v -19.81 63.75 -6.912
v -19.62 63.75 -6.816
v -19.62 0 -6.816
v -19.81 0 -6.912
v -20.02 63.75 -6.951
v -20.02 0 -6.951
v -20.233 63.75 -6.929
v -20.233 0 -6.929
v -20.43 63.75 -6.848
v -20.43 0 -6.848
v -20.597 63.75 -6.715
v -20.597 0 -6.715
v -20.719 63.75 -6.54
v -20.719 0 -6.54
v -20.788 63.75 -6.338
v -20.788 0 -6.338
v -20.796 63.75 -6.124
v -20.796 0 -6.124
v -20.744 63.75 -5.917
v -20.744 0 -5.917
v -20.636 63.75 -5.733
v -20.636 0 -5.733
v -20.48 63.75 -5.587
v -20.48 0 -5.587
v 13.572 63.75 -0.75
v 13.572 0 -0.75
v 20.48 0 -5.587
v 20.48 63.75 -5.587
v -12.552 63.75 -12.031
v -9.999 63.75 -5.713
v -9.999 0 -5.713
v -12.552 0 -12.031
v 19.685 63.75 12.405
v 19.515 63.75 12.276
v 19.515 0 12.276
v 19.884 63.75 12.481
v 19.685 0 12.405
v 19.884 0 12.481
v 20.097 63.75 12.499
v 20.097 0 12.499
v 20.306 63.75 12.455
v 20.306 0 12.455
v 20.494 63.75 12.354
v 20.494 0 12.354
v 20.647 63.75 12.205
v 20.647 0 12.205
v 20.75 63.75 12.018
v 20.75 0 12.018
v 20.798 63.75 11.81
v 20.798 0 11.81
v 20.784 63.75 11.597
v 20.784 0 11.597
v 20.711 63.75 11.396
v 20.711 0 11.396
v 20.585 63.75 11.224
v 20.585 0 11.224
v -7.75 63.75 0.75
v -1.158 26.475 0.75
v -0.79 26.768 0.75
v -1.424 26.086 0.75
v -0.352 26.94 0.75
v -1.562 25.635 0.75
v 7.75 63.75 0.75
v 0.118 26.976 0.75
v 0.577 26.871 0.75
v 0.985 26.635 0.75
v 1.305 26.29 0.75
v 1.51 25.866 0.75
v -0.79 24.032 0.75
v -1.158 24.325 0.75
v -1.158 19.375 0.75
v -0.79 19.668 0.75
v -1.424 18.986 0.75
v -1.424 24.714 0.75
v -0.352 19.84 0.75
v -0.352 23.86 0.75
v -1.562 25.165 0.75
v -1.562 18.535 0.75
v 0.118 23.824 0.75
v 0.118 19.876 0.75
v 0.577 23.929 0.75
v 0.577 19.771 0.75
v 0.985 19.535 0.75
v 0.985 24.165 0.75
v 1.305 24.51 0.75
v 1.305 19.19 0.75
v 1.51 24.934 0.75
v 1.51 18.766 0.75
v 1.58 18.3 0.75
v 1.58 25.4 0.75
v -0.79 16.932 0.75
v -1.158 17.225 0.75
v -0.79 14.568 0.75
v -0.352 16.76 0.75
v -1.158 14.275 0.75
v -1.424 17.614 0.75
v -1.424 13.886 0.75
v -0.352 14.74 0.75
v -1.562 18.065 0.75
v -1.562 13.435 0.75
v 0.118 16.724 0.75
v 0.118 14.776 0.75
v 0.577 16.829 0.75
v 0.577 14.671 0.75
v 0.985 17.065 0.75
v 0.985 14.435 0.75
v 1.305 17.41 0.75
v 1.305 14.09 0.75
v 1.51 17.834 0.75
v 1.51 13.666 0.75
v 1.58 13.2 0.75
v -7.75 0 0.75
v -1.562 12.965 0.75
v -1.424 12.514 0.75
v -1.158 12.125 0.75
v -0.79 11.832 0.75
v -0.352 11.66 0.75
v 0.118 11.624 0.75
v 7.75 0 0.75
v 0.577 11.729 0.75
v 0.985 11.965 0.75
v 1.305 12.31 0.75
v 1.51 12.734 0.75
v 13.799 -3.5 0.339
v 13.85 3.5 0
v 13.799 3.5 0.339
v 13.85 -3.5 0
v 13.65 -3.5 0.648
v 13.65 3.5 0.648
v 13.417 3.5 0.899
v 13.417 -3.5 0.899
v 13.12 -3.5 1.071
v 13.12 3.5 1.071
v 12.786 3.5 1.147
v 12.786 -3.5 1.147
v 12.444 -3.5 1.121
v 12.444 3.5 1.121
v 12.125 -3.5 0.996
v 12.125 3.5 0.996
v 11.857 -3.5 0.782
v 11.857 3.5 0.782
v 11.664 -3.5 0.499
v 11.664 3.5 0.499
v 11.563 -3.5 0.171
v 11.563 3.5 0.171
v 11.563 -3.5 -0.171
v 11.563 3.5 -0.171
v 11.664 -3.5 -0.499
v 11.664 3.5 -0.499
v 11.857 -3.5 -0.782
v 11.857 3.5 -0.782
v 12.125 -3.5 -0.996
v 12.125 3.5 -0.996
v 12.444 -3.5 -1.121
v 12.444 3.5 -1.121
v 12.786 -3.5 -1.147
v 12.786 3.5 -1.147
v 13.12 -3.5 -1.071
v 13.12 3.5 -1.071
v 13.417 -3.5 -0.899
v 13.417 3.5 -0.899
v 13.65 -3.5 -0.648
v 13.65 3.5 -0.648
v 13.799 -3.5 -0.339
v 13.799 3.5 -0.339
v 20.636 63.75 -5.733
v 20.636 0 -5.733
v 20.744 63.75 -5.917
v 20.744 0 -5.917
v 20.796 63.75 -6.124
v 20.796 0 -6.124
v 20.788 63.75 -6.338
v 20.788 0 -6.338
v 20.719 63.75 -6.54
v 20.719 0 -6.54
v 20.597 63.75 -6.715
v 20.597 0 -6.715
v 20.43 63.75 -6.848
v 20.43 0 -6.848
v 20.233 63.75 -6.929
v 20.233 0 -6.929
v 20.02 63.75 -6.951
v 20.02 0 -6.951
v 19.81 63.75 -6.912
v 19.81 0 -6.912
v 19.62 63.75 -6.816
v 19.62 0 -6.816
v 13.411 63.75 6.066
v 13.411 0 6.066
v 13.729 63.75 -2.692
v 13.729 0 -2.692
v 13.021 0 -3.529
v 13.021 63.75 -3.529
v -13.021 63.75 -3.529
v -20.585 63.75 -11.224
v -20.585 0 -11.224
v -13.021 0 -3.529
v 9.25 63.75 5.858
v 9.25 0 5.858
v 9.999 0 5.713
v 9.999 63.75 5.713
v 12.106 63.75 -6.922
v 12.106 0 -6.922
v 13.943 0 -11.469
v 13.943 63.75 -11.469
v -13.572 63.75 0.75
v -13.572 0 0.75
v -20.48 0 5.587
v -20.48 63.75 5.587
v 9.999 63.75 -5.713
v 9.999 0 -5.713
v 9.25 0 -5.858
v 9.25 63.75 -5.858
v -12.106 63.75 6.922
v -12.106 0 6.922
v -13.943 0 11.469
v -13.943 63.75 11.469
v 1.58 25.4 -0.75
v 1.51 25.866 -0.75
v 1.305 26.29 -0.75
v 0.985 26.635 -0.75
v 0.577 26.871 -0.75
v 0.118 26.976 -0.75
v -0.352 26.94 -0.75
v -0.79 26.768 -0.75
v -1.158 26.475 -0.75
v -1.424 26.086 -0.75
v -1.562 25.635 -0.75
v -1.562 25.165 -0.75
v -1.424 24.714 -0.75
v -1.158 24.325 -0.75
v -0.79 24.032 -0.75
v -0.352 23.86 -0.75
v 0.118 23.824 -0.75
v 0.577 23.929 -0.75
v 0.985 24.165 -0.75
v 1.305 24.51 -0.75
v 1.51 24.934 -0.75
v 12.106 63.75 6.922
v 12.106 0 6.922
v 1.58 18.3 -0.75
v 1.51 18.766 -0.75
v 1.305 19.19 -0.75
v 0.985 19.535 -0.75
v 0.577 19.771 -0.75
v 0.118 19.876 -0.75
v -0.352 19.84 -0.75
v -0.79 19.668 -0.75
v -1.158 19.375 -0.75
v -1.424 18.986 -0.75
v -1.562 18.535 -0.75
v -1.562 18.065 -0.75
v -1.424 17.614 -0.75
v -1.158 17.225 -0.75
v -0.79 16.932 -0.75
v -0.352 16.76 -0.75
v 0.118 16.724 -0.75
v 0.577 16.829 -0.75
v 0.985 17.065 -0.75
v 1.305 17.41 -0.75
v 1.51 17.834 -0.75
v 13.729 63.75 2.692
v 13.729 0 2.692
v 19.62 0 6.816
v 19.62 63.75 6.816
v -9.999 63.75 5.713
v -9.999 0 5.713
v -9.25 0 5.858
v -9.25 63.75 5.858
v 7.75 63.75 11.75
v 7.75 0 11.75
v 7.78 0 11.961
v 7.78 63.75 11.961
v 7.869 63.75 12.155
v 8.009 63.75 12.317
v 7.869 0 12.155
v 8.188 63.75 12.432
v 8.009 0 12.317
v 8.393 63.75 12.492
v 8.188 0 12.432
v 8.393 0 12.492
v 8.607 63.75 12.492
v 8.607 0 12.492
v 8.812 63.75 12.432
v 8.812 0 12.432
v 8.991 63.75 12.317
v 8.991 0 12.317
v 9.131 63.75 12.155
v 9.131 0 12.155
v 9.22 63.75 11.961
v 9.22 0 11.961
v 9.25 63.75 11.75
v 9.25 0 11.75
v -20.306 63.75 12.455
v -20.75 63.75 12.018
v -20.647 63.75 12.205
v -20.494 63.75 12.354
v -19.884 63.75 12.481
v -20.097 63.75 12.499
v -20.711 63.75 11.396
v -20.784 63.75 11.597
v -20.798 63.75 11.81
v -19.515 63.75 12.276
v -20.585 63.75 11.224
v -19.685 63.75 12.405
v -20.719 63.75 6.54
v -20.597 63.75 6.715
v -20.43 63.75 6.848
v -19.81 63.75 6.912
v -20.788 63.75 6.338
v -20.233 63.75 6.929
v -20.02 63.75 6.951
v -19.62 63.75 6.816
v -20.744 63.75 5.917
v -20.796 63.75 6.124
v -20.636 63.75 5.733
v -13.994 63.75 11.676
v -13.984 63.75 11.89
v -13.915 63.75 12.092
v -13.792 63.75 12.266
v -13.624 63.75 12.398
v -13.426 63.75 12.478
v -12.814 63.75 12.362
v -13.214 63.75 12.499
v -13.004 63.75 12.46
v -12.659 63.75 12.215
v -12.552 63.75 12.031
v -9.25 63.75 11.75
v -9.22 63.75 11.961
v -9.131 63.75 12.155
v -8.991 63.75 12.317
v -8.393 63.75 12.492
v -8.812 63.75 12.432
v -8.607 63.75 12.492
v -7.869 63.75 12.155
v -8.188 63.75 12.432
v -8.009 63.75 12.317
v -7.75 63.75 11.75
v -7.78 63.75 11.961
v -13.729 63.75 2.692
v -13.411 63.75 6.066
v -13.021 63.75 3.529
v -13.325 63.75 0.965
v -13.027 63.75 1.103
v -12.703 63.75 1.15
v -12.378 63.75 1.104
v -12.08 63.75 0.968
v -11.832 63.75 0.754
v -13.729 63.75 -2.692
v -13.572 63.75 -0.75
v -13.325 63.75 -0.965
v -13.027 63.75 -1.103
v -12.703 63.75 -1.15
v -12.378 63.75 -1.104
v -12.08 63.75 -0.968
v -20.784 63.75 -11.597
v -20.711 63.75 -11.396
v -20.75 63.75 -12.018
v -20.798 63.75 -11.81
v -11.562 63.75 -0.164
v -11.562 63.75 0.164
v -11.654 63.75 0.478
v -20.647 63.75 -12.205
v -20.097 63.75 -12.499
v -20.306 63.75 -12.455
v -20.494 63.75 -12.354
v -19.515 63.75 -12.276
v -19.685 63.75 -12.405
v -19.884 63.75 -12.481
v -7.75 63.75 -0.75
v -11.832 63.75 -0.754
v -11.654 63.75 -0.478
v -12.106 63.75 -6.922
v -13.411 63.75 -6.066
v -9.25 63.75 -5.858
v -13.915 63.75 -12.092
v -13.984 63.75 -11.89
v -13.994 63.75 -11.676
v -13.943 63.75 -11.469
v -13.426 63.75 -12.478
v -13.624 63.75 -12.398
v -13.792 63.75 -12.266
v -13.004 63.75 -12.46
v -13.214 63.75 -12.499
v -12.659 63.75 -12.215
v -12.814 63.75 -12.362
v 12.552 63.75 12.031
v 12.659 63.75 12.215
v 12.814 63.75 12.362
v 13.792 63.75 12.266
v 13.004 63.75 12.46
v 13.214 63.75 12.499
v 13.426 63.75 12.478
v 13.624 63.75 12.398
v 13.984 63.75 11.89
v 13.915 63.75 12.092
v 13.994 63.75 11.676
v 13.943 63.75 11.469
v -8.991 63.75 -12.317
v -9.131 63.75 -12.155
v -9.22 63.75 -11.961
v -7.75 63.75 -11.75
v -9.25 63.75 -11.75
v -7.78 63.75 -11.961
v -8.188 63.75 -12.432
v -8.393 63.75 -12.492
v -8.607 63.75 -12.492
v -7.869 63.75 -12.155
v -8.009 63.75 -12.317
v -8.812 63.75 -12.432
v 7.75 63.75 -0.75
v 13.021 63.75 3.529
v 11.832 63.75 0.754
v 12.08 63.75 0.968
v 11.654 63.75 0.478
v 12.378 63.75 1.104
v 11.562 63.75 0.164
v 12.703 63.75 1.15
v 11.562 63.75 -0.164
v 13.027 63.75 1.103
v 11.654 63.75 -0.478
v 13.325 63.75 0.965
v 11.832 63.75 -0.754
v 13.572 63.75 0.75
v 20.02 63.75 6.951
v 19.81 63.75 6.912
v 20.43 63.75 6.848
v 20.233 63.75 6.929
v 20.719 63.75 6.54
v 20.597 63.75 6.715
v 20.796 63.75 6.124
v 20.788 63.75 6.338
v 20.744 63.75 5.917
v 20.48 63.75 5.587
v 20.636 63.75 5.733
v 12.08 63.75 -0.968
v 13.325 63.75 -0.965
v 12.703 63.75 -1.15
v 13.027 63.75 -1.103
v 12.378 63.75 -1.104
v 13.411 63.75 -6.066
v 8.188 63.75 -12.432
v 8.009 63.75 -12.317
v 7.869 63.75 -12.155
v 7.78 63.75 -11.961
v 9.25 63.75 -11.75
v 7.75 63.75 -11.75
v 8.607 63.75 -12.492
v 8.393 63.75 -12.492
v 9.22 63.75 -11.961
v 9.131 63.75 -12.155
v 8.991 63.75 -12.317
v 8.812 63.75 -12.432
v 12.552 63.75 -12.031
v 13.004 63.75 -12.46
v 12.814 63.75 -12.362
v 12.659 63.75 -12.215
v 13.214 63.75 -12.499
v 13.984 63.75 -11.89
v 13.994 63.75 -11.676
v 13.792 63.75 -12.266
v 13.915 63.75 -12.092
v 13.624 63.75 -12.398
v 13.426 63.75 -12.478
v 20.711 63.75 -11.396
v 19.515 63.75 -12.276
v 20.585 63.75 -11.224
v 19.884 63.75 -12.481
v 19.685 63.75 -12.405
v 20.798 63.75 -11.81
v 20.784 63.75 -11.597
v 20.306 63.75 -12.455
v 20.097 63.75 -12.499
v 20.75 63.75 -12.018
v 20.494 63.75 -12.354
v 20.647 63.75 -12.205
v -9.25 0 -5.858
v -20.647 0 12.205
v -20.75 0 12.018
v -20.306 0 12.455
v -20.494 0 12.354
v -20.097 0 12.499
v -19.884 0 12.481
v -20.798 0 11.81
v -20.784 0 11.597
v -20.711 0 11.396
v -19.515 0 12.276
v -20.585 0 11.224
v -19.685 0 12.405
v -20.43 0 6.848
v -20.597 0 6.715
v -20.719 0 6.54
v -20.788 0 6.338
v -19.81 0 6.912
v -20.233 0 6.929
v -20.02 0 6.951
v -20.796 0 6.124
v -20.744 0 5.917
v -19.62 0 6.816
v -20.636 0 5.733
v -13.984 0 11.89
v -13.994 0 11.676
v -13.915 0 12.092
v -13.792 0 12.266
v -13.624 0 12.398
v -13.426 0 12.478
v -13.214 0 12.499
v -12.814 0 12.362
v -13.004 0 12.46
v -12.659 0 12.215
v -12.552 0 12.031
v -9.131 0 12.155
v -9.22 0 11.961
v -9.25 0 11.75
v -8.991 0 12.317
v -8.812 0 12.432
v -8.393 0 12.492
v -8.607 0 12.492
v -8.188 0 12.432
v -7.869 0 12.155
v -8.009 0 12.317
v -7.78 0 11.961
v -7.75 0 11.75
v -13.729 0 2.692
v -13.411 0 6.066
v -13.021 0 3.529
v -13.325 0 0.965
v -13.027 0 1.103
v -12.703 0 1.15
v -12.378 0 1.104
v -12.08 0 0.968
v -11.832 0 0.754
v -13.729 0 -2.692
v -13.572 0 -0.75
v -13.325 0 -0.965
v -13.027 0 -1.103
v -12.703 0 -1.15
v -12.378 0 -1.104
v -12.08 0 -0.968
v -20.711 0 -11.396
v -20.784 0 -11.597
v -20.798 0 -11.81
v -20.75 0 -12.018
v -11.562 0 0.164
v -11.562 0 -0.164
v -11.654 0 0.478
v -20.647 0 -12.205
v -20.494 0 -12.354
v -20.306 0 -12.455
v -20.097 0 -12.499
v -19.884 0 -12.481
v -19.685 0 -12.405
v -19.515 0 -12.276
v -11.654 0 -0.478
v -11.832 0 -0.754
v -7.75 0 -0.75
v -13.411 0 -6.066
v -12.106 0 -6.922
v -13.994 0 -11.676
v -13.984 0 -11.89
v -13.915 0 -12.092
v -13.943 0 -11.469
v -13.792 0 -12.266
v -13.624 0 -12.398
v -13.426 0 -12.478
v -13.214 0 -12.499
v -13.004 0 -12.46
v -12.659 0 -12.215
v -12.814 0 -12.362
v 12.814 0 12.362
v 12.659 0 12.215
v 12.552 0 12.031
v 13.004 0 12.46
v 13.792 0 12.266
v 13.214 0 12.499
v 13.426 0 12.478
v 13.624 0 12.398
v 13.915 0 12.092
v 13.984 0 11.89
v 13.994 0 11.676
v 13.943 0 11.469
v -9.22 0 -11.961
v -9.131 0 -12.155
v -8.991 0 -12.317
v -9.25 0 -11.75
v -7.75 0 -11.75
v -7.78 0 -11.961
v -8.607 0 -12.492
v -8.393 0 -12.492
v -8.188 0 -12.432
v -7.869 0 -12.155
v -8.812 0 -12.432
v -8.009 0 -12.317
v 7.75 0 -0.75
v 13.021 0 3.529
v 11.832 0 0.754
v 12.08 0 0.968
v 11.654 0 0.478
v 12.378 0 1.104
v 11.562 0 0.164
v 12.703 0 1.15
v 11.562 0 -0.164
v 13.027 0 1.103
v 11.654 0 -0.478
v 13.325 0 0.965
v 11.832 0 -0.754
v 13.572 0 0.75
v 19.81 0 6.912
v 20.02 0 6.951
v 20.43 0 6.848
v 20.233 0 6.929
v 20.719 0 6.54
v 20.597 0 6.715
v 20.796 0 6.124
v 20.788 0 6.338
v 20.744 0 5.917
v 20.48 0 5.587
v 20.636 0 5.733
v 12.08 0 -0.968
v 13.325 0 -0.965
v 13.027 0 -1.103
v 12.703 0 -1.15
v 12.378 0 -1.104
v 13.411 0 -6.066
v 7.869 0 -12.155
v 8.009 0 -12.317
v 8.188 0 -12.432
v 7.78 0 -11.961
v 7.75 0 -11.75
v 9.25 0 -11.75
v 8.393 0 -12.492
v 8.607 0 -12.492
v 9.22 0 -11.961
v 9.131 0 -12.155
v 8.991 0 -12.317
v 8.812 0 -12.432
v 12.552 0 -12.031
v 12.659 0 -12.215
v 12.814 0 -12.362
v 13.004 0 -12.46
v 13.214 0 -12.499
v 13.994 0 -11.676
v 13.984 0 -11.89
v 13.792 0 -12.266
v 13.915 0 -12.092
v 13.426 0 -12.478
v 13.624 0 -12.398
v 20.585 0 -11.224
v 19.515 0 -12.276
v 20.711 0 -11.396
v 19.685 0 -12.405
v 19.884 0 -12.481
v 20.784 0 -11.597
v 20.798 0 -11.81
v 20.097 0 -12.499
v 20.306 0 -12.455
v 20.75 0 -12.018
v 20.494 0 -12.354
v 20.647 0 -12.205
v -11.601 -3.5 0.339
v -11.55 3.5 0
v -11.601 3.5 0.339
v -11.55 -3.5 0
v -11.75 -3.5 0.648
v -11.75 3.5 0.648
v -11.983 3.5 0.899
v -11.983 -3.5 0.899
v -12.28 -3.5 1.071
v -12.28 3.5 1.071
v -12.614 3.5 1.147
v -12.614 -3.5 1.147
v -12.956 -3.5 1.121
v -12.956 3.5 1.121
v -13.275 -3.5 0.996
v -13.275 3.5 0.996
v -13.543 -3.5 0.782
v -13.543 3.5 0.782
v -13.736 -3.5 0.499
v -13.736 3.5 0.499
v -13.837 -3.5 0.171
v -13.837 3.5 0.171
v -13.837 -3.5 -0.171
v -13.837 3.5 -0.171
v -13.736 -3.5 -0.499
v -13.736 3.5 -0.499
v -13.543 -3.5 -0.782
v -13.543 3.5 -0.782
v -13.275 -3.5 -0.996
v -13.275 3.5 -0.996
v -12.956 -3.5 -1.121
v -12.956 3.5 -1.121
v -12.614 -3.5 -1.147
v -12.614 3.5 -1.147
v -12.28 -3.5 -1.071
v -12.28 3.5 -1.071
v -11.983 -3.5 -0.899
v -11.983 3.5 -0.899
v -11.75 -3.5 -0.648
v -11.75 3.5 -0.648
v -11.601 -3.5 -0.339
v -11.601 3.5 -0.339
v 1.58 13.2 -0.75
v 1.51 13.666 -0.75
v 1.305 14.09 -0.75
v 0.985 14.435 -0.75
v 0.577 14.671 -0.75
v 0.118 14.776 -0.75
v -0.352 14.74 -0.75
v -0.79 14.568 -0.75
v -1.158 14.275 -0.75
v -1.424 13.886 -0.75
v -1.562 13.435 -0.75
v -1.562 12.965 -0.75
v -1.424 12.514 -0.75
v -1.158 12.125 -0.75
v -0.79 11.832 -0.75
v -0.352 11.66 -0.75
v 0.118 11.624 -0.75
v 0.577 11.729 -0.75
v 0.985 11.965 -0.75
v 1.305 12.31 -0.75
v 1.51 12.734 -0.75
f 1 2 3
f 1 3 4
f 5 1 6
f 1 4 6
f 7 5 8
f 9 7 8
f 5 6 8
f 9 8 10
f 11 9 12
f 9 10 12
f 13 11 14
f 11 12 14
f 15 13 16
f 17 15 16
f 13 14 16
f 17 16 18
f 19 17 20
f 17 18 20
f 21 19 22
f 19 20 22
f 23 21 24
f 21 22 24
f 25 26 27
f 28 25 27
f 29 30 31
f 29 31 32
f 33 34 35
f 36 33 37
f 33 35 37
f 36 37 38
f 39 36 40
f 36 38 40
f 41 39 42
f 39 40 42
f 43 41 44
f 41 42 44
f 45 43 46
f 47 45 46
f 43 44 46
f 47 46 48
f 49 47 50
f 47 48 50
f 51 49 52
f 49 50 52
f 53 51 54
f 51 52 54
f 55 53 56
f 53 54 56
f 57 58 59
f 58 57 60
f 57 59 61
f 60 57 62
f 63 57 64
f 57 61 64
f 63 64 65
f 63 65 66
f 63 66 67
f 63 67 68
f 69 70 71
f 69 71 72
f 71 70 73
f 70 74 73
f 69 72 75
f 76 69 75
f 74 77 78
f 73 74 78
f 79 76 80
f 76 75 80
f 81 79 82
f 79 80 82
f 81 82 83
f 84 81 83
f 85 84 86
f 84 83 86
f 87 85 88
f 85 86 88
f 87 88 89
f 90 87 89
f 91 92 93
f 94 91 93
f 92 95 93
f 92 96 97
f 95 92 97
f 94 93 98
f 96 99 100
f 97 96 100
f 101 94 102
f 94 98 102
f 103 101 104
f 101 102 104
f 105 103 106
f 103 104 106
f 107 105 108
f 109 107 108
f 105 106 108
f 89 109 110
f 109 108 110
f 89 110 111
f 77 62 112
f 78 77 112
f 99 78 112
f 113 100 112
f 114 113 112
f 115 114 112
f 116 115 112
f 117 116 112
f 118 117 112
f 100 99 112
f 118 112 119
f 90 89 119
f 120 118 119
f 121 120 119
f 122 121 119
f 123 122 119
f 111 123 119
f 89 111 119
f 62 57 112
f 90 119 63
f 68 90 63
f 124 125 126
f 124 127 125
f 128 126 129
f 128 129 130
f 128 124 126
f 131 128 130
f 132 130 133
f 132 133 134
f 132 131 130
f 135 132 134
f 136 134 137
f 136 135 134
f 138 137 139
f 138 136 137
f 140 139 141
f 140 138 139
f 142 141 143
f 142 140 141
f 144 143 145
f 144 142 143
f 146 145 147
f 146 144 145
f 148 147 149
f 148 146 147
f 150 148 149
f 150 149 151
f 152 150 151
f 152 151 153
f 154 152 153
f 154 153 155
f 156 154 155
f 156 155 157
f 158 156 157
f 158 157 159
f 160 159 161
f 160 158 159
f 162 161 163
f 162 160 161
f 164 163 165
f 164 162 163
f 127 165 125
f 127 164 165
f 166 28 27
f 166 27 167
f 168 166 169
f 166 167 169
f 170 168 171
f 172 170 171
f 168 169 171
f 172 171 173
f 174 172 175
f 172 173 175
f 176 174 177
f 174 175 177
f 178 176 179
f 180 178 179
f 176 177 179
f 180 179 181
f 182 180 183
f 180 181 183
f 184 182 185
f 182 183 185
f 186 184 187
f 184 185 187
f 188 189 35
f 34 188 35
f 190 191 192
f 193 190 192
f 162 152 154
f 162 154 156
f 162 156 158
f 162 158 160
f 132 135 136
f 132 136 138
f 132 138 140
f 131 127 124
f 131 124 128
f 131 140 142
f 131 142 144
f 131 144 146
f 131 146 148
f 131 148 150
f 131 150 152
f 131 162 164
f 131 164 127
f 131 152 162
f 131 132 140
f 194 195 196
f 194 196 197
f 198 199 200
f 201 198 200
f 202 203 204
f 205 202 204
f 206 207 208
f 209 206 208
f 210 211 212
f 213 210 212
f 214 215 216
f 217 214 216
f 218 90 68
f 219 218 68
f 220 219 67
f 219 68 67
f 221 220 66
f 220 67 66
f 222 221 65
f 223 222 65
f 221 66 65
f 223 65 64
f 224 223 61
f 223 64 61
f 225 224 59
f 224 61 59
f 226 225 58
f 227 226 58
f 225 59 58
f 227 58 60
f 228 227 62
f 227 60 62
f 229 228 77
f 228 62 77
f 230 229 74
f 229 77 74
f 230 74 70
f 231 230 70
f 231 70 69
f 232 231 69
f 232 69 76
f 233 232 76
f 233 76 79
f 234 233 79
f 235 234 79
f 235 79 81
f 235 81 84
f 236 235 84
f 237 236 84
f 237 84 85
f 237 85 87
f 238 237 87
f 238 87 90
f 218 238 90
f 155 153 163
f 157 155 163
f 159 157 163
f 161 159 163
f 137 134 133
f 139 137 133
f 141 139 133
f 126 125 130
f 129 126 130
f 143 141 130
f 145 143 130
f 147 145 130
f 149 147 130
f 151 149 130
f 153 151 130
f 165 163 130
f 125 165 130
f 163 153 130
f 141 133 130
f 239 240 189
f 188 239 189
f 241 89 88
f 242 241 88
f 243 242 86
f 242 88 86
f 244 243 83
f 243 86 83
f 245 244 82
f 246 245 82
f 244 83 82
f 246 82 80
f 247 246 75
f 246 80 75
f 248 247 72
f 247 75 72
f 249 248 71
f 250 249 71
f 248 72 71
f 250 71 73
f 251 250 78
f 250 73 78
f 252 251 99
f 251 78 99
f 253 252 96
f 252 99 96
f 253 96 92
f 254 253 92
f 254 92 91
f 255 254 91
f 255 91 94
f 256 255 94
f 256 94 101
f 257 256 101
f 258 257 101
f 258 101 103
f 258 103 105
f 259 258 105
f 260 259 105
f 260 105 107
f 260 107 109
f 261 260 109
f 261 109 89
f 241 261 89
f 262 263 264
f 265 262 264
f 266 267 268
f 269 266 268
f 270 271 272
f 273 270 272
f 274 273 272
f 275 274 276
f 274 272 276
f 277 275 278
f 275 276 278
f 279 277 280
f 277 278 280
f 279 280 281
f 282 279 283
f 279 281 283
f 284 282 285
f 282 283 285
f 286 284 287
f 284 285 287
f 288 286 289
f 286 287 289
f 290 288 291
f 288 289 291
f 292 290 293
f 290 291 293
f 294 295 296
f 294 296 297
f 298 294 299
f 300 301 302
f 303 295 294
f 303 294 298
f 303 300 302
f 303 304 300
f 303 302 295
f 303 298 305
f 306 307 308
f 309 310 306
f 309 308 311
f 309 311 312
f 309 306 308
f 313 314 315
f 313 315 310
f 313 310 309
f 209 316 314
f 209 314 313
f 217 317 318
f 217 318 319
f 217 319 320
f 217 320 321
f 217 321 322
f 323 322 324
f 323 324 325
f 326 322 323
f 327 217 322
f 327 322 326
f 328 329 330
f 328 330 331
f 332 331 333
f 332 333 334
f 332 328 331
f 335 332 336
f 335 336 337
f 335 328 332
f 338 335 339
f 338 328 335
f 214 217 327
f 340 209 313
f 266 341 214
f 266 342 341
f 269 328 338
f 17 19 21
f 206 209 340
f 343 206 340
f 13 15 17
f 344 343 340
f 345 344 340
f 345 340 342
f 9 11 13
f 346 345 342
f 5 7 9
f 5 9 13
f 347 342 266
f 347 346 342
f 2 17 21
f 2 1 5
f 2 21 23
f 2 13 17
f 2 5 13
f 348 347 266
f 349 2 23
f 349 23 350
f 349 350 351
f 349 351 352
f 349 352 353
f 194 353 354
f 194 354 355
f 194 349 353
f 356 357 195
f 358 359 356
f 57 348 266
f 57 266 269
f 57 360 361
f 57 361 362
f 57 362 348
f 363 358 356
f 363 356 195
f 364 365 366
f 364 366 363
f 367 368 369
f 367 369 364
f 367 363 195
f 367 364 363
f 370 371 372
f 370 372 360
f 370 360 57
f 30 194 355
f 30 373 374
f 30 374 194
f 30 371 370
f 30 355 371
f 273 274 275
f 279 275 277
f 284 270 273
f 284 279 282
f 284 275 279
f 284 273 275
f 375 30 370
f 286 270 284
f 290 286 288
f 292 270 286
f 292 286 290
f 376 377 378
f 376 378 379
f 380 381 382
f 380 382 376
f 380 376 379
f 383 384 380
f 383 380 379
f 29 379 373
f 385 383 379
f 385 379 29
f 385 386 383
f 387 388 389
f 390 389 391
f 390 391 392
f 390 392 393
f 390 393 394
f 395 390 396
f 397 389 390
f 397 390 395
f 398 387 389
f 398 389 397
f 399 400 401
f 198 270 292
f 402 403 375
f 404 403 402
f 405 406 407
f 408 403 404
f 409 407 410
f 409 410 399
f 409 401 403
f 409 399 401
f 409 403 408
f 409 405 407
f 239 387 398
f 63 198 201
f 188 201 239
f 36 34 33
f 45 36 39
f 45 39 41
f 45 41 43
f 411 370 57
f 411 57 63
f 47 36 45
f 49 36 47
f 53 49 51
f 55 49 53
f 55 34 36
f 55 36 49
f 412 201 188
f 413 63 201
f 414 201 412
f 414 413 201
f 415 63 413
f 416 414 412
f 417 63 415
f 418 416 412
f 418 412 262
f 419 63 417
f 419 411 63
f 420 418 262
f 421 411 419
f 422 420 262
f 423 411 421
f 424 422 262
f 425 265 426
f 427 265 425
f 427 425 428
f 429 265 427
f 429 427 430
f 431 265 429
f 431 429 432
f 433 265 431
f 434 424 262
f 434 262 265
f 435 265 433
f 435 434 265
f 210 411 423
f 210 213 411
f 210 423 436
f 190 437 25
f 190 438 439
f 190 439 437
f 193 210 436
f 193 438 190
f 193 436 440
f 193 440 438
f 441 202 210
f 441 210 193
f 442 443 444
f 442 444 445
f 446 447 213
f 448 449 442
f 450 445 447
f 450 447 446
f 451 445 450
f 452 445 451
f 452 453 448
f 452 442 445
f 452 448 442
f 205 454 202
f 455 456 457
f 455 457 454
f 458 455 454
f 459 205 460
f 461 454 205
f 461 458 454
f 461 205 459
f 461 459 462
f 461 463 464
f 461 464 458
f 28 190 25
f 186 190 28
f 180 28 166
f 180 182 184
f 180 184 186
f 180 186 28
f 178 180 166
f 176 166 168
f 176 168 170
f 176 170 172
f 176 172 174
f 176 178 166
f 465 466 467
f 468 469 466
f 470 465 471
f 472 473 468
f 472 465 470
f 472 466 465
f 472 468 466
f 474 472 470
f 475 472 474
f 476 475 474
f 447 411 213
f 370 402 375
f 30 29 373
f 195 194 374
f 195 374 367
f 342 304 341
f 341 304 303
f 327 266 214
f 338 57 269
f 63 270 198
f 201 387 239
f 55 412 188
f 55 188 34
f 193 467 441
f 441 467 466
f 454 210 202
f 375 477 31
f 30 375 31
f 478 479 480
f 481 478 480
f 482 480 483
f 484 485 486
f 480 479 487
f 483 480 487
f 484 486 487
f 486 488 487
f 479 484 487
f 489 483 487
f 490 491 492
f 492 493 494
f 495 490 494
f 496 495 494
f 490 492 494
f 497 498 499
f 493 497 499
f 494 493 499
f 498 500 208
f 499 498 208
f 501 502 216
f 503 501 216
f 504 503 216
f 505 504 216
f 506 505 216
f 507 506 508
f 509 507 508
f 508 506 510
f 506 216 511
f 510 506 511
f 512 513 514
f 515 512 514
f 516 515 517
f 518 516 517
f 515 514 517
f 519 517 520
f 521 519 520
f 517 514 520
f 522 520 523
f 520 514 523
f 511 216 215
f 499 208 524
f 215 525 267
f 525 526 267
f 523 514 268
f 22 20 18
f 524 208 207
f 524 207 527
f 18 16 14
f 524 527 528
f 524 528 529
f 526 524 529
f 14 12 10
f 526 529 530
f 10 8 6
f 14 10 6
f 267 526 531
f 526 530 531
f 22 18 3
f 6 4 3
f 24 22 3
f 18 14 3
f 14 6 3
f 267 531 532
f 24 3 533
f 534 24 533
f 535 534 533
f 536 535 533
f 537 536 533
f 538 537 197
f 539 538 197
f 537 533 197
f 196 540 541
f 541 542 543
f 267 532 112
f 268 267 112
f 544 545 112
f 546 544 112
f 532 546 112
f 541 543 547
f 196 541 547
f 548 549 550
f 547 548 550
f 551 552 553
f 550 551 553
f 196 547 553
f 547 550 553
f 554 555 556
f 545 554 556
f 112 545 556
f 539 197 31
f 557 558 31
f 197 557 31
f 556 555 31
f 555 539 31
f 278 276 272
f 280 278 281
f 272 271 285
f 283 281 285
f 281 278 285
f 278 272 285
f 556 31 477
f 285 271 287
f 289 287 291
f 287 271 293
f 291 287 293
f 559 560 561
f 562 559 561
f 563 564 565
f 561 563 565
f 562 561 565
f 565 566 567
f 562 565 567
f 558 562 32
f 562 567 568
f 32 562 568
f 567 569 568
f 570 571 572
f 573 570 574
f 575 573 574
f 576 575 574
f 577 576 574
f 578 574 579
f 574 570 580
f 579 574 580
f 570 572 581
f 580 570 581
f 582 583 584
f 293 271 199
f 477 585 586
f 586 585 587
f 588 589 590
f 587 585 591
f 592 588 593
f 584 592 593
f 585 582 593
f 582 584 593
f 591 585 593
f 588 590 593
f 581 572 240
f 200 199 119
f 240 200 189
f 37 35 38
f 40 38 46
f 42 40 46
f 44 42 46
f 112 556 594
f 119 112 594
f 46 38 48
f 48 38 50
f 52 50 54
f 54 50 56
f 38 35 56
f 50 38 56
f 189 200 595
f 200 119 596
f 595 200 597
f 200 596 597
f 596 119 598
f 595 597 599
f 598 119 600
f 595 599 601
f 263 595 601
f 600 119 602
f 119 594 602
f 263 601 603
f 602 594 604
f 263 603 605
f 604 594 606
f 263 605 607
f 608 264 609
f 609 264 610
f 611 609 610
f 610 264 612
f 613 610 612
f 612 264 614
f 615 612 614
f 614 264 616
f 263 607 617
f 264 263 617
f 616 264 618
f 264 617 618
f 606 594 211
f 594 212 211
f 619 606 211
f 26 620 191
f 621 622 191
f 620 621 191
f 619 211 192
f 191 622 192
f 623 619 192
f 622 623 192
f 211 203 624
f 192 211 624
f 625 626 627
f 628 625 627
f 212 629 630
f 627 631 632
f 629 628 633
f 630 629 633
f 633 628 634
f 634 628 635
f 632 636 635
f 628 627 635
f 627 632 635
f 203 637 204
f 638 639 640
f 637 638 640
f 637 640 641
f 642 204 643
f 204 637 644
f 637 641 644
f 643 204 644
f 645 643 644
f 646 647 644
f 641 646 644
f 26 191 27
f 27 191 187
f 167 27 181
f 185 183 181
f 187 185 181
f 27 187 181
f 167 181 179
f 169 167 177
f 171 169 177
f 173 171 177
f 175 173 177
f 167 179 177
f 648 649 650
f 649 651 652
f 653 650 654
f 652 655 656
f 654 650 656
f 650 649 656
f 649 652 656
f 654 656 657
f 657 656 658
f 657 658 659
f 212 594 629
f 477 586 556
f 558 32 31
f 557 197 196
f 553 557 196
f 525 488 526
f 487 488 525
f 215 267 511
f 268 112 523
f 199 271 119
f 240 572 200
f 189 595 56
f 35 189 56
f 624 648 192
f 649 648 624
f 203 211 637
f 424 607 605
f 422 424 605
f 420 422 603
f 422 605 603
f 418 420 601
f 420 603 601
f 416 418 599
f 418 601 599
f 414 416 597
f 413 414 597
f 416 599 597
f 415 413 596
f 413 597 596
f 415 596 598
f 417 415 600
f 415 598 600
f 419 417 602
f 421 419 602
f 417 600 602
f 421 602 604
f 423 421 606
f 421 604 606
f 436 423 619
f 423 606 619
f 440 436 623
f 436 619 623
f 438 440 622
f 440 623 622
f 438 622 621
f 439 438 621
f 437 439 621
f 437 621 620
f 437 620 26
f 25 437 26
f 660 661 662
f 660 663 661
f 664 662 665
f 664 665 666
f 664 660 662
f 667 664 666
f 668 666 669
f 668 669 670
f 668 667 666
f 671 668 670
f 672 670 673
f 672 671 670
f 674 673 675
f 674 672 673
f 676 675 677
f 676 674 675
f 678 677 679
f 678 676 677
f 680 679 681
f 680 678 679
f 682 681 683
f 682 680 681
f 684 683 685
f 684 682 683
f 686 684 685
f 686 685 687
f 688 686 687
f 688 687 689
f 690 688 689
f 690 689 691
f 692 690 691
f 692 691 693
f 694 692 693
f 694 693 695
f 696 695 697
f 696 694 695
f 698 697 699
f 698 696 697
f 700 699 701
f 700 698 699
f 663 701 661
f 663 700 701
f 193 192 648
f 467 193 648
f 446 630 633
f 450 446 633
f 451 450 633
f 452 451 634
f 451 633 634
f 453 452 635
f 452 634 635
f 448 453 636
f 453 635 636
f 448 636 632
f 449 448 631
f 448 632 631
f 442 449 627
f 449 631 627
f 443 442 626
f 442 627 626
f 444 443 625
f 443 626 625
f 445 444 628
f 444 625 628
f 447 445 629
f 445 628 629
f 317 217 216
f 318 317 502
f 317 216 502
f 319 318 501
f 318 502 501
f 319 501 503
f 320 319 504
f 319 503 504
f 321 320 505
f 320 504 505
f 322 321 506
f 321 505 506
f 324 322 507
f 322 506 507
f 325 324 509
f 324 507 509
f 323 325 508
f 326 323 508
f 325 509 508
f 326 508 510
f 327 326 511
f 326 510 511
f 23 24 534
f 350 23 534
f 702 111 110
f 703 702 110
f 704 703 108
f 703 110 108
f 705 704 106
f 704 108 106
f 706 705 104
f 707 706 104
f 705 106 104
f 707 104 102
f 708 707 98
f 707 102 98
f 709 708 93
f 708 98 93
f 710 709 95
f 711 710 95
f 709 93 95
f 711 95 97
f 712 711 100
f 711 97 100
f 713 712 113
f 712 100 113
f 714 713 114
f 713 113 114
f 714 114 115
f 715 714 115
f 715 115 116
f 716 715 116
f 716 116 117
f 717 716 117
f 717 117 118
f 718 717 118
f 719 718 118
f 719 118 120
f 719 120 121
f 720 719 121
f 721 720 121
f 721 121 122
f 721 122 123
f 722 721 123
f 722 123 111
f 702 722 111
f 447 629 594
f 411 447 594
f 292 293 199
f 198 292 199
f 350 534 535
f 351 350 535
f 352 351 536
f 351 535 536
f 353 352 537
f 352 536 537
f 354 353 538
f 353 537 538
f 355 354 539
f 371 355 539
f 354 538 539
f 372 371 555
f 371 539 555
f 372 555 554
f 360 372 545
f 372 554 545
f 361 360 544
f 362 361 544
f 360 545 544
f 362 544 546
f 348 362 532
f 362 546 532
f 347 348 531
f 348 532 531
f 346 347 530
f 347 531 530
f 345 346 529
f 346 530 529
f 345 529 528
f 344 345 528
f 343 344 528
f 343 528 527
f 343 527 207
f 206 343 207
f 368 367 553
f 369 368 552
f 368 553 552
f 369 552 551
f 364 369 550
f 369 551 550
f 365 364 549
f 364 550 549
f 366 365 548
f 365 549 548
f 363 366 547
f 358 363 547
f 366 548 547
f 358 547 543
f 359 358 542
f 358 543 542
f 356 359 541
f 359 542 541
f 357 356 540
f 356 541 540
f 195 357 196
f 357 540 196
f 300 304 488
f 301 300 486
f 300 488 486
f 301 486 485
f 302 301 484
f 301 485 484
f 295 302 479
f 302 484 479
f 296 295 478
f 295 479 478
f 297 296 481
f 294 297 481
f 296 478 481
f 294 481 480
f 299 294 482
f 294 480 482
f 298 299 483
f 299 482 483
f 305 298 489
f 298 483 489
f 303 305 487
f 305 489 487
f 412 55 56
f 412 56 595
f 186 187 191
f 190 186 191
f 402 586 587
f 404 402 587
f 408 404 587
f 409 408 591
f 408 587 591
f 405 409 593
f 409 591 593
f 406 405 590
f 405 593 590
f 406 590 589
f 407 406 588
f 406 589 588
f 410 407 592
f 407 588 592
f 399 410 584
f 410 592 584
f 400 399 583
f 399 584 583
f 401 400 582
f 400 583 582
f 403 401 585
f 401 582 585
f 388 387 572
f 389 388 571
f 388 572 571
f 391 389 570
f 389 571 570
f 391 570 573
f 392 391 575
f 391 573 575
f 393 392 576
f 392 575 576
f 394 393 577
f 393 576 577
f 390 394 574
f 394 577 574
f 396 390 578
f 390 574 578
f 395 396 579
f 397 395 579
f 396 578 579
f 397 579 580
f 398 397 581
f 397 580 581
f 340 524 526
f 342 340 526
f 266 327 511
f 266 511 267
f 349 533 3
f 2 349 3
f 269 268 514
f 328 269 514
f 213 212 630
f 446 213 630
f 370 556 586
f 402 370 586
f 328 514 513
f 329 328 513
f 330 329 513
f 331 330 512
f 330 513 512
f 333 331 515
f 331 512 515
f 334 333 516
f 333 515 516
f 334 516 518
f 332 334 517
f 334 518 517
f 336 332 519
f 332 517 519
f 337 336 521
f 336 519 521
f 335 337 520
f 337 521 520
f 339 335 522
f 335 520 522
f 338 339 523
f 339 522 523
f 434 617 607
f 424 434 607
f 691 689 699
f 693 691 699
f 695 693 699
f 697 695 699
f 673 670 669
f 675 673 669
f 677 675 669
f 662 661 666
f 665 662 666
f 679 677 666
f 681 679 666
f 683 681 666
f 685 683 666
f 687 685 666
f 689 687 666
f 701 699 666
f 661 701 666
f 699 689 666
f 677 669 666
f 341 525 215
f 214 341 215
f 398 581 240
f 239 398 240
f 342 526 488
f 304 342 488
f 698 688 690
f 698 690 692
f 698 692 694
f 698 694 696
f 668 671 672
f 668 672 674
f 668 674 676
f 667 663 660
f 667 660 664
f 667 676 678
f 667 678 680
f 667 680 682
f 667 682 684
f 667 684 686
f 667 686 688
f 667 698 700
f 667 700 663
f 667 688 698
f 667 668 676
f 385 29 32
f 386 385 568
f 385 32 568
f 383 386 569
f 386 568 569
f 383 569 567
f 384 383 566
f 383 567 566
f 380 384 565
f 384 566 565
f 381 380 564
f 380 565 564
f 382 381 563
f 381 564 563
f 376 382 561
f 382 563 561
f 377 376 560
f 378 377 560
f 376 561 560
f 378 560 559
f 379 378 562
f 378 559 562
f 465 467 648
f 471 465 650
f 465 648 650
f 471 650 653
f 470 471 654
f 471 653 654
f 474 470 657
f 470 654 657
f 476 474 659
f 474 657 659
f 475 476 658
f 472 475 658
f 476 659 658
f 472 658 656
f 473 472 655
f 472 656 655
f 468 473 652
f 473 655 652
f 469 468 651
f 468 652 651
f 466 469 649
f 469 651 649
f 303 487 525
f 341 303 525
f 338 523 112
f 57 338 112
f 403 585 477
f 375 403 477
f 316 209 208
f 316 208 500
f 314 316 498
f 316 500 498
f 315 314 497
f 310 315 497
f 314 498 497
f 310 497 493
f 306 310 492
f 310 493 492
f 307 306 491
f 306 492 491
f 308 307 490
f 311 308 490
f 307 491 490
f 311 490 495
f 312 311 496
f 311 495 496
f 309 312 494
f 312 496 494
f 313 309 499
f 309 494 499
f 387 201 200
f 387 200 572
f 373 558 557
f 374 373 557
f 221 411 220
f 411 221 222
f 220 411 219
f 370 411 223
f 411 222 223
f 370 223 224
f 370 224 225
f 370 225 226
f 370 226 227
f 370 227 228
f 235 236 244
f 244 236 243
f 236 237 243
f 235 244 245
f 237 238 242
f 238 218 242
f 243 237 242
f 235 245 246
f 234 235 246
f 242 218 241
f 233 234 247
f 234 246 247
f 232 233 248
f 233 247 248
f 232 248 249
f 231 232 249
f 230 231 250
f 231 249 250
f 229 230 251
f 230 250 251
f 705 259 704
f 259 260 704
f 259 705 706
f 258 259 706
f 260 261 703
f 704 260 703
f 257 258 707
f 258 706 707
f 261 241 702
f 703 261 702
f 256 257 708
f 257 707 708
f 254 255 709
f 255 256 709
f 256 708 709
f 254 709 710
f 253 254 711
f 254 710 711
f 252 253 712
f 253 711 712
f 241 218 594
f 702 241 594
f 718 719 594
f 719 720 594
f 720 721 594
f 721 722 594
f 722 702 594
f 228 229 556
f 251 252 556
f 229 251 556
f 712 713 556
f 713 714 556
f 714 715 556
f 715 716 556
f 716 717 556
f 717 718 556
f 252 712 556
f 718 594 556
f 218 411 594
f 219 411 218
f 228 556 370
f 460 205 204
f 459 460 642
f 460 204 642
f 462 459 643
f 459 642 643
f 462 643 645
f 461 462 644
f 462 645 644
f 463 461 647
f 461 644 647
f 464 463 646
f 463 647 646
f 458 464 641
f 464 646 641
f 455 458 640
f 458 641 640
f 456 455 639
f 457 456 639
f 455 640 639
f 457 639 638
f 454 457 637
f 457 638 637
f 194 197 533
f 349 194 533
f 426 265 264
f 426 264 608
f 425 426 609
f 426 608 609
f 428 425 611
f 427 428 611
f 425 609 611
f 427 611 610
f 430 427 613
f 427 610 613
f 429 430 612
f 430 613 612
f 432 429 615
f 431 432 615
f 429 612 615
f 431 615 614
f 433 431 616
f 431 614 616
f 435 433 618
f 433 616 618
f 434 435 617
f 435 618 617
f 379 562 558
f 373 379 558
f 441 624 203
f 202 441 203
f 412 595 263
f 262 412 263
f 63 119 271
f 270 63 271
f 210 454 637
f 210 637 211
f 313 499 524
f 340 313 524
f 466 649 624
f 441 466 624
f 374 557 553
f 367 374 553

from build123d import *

# Parameters (mm, degrees)
BOSS_EXTRUDE1_DEPTH        = 63.75
CUT_EXTRUDE1_REACH         = 15.25
SKETCH2_R                  = 1.58
SKETCH3_R                  = 1.15
BOSS_EXTRUDE2_DEPTH        = 3.5
BOSS_EXTRUDE2_DEPTH_BACK   = 3.5
BOSS_EXTRUDE2_2_DEPTH      = 3.5
BOSS_EXTRUDE2_2_DEPTH_BACK = 3.5


with BuildPart() as part:
    # Sketch1 → Boss-Extrude1 (new body)
    with BuildSketch(Plane(origin=(0, 0, 0), x_dir=(1, 0, 0), z_dir=(0, 1, 0))):
        with BuildLine():
            Line((7.75, 11.75), (7.75, 0.75))
            Line((7.75, 0.75), (-7.75, 0.75))
            Line((-7.75, 0.75), (-7.75, 11.75))
            ThreePointArc((-7.75, 11.75), (-8.5, 12.5), (-9.25, 11.75))
            Line((-9.25, 11.75), (-9.25, 5.858415512))
            Line((-9.25, 5.858415512), (-9.999213187, 5.712783221))
            Line((-9.999213187, 5.712783221), (-12.551920263, 12.030954945))
            ThreePointArc((-12.551920263, 12.030954945), (-13.528263099, 12.445387891), (-13.942696044, 11.469045055))
            Line((-13.942696044, 11.469045055), (-12.10574193, 6.922424076))
            Line((-12.10574193, 6.922424076), (-13.411361038, 6.06628904))
            Line((-13.411361038, 6.06628904), (-19.515137428, 12.275758528))
            ThreePointArc((-19.515137428, 12.275758528), (-20.575758528, 12.284862572), (-20.584862572, 11.224241472))
            Line((-20.584862572, 11.224241472), (-13.020617465, 3.529013766))
            Line((-13.020617465, 3.529013766), (-13.729461508, 2.691571812))
            Line((-13.729461508, 2.691571812), (-19.619817673, 6.816043601))
            ThreePointArc((-19.619817673, 6.816043601), (-20.664364033, 6.631861895), (-20.480182327, 5.587315534))
            Line((-20.480182327, 5.587315534), (-13.571779789, 0.75))
            ThreePointArc((-13.571779789, 0.75), (-11.55, 0), (-13.571779789, -0.75))
            Line((-13.571779789, -0.75), (-20.480182327, -5.587315534))
            ThreePointArc((-20.480182327, -5.587315534), (-20.664364033, -6.631861895), (-19.619817673, -6.816043601))
            Line((-19.619817673, -6.816043601), (-13.729461508, -2.691571812))
            Line((-13.729461508, -2.691571812), (-13.020617465, -3.529013766))
            Line((-13.020617465, -3.529013766), (-20.584862572, -11.224241472))
            ThreePointArc((-20.584862572, -11.224241472), (-20.575758528, -12.284862572), (-19.515137428, -12.275758528))
            Line((-19.515137428, -12.275758528), (-13.411361038, -6.06628904))
            Line((-13.411361038, -6.06628904), (-12.10574193, -6.922424076))
            Line((-12.10574193, -6.922424076), (-13.942696044, -11.469045055))
            ThreePointArc((-13.942696044, -11.469045055), (-13.528263099, -12.445387891), (-12.551920263, -12.030954945))
            Line((-12.551920263, -12.030954945), (-9.999213187, -5.712783221))
            Line((-9.999213187, -5.712783221), (-9.25, -5.858415512))
            Line((-9.25, -5.858415512), (-9.25, -11.75))
            ThreePointArc((-9.25, -11.75), (-8.5, -12.5), (-7.75, -11.75))
            Line((-7.75, -11.75), (-7.75, -0.75))
            Line((-7.75, -0.75), (7.75, -0.75))
            Line((7.75, -0.75), (7.75, -11.75))
            ThreePointArc((7.75, -11.75), (8.5, -12.5), (9.25, -11.75))
            Line((9.25, -11.75), (9.25, -5.858415512))
            Line((9.25, -5.858415512), (9.999213187, -5.712783221))
            Line((9.999213187, -5.712783221), (12.551920263, -12.030954945))
            ThreePointArc((12.551920263, -12.030954945), (13.528263099, -12.445387891), (13.942696044, -11.469045055))
            Line((13.942696044, -11.469045055), (12.10574193, -6.922424076))
            Line((12.10574193, -6.922424076), (13.411361038, -6.06628904))
            Line((13.411361038, -6.06628904), (19.515137428, -12.275758528))
            ThreePointArc((19.515137428, -12.275758528), (20.575758528, -12.284862572), (20.584862572, -11.224241472))
            Line((20.584862572, -11.224241472), (13.020617465, -3.529013766))
            Line((13.020617465, -3.529013766), (13.729461508, -2.691571812))
            Line((13.729461508, -2.691571812), (19.619817673, -6.816043601))
            ThreePointArc((19.619817673, -6.816043601), (20.664364033, -6.631861895), (20.480182327, -5.587315534))
            Line((20.480182327, -5.587315534), (13.571779789, -0.75))
            ThreePointArc((13.571779789, -0.75), (11.55, 0), (13.571779789, 0.75))
            Line((13.571779789, 0.75), (20.480182327, 5.587315534))
            ThreePointArc((20.480182327, 5.587315534), (20.664364033, 6.631861895), (19.619817673, 6.816043601))
            Line((19.619817673, 6.816043601), (13.729461508, 2.691571812))
            Line((13.729461508, 2.691571812), (13.020617465, 3.529013766))
            Line((13.020617465, 3.529013766), (20.584862572, 11.224241472))
            ThreePointArc((20.584862572, 11.224241472), (20.575758528, 12.284862572), (19.515137428, 12.275758528))
            Line((19.515137428, 12.275758528), (13.411361038, 6.06628904))
            Line((13.411361038, 6.06628904), (12.10574193, 6.922424076))
            Line((12.10574193, 6.922424076), (13.942696044, 11.469045055))
            ThreePointArc((13.942696044, 11.469045055), (13.528263099, 12.445387891), (12.551920263, 12.030954945))
            Line((12.551920263, 12.030954945), (9.999213187, 5.712783221))
            Line((9.999213187, 5.712783221), (9.25, 5.858415512))
            Line((9.25, 5.858415512), (9.25, 11.75))
            ThreePointArc((9.25, 11.75), (8.5, 12.5), (7.75, 11.75))
        make_face()
    extrude(amount=BOSS_EXTRUDE1_DEPTH)

    # Sketch2 → Cut-Extrude1 (cut, up to next)
    with BuildSketch(Plane.XY.offset(0.75), mode=Mode.PRIVATE) as cut_extrude1_sk1:
        with Locations((0, 13.2)):
            Circle(SKETCH2_R)
    cut_extrude1_tool1 = extrude(cut_extrude1_sk1.sketch, amount=-CUT_EXTRUDE1_REACH, mode=Mode.PRIVATE) & part.part
    add(cut_extrude1_tool1.solids().sort_by_distance((0, 13.2, 0.75))[0], mode=Mode.SUBTRACT)
    # Sketch2 → Cut-Extrude1 (cut, up to next)
    with BuildSketch(Plane.XY.offset(0.75), mode=Mode.PRIVATE) as cut_extrude1_sk2:
        with Locations((0, 18.3)):
            Circle(SKETCH2_R)
    cut_extrude1_tool2 = extrude(cut_extrude1_sk2.sketch, amount=-CUT_EXTRUDE1_REACH, mode=Mode.PRIVATE) & part.part
    add(cut_extrude1_tool2.solids().sort_by_distance((0, 18.3, 0.75))[0], mode=Mode.SUBTRACT)
    # Sketch2 → Cut-Extrude1 (cut, up to next)
    with BuildSketch(Plane.XY.offset(0.75), mode=Mode.PRIVATE) as cut_extrude1_sk3:
        with Locations((0, 25.4)):
            Circle(SKETCH2_R)
    cut_extrude1_tool3 = extrude(cut_extrude1_sk3.sketch, amount=-CUT_EXTRUDE1_REACH, mode=Mode.PRIVATE) & part.part
    add(cut_extrude1_tool3.solids().sort_by_distance((0, 25.4, 0.75))[0], mode=Mode.SUBTRACT)


with BuildPart() as body_2:
    # Sketch3 → Boss-Extrude2 (new body, two sides)
    with BuildSketch(Plane.XZ) as boss_extrude2_sk:
        with Locations((-12.7, 0)):
            Circle(SKETCH3_R)
    extrude(amount=BOSS_EXTRUDE2_DEPTH)
    extrude(boss_extrude2_sk.sketch, amount=-BOSS_EXTRUDE2_DEPTH_BACK)


with BuildPart() as body_3:
    # Sketch3 → Boss-Extrude2 2 (new body, two sides)
    with BuildSketch(Plane.XZ) as boss_extrude2_2_sk:
        with Locations((12.7, 0)):
            Circle(SKETCH3_R)
    extrude(amount=BOSS_EXTRUDE2_2_DEPTH)
    extrude(boss_extrude2_2_sk.sketch, amount=-BOSS_EXTRUDE2_2_DEPTH_BACK)


solid = Compound([part.part, body_2.part, body_3.part])
